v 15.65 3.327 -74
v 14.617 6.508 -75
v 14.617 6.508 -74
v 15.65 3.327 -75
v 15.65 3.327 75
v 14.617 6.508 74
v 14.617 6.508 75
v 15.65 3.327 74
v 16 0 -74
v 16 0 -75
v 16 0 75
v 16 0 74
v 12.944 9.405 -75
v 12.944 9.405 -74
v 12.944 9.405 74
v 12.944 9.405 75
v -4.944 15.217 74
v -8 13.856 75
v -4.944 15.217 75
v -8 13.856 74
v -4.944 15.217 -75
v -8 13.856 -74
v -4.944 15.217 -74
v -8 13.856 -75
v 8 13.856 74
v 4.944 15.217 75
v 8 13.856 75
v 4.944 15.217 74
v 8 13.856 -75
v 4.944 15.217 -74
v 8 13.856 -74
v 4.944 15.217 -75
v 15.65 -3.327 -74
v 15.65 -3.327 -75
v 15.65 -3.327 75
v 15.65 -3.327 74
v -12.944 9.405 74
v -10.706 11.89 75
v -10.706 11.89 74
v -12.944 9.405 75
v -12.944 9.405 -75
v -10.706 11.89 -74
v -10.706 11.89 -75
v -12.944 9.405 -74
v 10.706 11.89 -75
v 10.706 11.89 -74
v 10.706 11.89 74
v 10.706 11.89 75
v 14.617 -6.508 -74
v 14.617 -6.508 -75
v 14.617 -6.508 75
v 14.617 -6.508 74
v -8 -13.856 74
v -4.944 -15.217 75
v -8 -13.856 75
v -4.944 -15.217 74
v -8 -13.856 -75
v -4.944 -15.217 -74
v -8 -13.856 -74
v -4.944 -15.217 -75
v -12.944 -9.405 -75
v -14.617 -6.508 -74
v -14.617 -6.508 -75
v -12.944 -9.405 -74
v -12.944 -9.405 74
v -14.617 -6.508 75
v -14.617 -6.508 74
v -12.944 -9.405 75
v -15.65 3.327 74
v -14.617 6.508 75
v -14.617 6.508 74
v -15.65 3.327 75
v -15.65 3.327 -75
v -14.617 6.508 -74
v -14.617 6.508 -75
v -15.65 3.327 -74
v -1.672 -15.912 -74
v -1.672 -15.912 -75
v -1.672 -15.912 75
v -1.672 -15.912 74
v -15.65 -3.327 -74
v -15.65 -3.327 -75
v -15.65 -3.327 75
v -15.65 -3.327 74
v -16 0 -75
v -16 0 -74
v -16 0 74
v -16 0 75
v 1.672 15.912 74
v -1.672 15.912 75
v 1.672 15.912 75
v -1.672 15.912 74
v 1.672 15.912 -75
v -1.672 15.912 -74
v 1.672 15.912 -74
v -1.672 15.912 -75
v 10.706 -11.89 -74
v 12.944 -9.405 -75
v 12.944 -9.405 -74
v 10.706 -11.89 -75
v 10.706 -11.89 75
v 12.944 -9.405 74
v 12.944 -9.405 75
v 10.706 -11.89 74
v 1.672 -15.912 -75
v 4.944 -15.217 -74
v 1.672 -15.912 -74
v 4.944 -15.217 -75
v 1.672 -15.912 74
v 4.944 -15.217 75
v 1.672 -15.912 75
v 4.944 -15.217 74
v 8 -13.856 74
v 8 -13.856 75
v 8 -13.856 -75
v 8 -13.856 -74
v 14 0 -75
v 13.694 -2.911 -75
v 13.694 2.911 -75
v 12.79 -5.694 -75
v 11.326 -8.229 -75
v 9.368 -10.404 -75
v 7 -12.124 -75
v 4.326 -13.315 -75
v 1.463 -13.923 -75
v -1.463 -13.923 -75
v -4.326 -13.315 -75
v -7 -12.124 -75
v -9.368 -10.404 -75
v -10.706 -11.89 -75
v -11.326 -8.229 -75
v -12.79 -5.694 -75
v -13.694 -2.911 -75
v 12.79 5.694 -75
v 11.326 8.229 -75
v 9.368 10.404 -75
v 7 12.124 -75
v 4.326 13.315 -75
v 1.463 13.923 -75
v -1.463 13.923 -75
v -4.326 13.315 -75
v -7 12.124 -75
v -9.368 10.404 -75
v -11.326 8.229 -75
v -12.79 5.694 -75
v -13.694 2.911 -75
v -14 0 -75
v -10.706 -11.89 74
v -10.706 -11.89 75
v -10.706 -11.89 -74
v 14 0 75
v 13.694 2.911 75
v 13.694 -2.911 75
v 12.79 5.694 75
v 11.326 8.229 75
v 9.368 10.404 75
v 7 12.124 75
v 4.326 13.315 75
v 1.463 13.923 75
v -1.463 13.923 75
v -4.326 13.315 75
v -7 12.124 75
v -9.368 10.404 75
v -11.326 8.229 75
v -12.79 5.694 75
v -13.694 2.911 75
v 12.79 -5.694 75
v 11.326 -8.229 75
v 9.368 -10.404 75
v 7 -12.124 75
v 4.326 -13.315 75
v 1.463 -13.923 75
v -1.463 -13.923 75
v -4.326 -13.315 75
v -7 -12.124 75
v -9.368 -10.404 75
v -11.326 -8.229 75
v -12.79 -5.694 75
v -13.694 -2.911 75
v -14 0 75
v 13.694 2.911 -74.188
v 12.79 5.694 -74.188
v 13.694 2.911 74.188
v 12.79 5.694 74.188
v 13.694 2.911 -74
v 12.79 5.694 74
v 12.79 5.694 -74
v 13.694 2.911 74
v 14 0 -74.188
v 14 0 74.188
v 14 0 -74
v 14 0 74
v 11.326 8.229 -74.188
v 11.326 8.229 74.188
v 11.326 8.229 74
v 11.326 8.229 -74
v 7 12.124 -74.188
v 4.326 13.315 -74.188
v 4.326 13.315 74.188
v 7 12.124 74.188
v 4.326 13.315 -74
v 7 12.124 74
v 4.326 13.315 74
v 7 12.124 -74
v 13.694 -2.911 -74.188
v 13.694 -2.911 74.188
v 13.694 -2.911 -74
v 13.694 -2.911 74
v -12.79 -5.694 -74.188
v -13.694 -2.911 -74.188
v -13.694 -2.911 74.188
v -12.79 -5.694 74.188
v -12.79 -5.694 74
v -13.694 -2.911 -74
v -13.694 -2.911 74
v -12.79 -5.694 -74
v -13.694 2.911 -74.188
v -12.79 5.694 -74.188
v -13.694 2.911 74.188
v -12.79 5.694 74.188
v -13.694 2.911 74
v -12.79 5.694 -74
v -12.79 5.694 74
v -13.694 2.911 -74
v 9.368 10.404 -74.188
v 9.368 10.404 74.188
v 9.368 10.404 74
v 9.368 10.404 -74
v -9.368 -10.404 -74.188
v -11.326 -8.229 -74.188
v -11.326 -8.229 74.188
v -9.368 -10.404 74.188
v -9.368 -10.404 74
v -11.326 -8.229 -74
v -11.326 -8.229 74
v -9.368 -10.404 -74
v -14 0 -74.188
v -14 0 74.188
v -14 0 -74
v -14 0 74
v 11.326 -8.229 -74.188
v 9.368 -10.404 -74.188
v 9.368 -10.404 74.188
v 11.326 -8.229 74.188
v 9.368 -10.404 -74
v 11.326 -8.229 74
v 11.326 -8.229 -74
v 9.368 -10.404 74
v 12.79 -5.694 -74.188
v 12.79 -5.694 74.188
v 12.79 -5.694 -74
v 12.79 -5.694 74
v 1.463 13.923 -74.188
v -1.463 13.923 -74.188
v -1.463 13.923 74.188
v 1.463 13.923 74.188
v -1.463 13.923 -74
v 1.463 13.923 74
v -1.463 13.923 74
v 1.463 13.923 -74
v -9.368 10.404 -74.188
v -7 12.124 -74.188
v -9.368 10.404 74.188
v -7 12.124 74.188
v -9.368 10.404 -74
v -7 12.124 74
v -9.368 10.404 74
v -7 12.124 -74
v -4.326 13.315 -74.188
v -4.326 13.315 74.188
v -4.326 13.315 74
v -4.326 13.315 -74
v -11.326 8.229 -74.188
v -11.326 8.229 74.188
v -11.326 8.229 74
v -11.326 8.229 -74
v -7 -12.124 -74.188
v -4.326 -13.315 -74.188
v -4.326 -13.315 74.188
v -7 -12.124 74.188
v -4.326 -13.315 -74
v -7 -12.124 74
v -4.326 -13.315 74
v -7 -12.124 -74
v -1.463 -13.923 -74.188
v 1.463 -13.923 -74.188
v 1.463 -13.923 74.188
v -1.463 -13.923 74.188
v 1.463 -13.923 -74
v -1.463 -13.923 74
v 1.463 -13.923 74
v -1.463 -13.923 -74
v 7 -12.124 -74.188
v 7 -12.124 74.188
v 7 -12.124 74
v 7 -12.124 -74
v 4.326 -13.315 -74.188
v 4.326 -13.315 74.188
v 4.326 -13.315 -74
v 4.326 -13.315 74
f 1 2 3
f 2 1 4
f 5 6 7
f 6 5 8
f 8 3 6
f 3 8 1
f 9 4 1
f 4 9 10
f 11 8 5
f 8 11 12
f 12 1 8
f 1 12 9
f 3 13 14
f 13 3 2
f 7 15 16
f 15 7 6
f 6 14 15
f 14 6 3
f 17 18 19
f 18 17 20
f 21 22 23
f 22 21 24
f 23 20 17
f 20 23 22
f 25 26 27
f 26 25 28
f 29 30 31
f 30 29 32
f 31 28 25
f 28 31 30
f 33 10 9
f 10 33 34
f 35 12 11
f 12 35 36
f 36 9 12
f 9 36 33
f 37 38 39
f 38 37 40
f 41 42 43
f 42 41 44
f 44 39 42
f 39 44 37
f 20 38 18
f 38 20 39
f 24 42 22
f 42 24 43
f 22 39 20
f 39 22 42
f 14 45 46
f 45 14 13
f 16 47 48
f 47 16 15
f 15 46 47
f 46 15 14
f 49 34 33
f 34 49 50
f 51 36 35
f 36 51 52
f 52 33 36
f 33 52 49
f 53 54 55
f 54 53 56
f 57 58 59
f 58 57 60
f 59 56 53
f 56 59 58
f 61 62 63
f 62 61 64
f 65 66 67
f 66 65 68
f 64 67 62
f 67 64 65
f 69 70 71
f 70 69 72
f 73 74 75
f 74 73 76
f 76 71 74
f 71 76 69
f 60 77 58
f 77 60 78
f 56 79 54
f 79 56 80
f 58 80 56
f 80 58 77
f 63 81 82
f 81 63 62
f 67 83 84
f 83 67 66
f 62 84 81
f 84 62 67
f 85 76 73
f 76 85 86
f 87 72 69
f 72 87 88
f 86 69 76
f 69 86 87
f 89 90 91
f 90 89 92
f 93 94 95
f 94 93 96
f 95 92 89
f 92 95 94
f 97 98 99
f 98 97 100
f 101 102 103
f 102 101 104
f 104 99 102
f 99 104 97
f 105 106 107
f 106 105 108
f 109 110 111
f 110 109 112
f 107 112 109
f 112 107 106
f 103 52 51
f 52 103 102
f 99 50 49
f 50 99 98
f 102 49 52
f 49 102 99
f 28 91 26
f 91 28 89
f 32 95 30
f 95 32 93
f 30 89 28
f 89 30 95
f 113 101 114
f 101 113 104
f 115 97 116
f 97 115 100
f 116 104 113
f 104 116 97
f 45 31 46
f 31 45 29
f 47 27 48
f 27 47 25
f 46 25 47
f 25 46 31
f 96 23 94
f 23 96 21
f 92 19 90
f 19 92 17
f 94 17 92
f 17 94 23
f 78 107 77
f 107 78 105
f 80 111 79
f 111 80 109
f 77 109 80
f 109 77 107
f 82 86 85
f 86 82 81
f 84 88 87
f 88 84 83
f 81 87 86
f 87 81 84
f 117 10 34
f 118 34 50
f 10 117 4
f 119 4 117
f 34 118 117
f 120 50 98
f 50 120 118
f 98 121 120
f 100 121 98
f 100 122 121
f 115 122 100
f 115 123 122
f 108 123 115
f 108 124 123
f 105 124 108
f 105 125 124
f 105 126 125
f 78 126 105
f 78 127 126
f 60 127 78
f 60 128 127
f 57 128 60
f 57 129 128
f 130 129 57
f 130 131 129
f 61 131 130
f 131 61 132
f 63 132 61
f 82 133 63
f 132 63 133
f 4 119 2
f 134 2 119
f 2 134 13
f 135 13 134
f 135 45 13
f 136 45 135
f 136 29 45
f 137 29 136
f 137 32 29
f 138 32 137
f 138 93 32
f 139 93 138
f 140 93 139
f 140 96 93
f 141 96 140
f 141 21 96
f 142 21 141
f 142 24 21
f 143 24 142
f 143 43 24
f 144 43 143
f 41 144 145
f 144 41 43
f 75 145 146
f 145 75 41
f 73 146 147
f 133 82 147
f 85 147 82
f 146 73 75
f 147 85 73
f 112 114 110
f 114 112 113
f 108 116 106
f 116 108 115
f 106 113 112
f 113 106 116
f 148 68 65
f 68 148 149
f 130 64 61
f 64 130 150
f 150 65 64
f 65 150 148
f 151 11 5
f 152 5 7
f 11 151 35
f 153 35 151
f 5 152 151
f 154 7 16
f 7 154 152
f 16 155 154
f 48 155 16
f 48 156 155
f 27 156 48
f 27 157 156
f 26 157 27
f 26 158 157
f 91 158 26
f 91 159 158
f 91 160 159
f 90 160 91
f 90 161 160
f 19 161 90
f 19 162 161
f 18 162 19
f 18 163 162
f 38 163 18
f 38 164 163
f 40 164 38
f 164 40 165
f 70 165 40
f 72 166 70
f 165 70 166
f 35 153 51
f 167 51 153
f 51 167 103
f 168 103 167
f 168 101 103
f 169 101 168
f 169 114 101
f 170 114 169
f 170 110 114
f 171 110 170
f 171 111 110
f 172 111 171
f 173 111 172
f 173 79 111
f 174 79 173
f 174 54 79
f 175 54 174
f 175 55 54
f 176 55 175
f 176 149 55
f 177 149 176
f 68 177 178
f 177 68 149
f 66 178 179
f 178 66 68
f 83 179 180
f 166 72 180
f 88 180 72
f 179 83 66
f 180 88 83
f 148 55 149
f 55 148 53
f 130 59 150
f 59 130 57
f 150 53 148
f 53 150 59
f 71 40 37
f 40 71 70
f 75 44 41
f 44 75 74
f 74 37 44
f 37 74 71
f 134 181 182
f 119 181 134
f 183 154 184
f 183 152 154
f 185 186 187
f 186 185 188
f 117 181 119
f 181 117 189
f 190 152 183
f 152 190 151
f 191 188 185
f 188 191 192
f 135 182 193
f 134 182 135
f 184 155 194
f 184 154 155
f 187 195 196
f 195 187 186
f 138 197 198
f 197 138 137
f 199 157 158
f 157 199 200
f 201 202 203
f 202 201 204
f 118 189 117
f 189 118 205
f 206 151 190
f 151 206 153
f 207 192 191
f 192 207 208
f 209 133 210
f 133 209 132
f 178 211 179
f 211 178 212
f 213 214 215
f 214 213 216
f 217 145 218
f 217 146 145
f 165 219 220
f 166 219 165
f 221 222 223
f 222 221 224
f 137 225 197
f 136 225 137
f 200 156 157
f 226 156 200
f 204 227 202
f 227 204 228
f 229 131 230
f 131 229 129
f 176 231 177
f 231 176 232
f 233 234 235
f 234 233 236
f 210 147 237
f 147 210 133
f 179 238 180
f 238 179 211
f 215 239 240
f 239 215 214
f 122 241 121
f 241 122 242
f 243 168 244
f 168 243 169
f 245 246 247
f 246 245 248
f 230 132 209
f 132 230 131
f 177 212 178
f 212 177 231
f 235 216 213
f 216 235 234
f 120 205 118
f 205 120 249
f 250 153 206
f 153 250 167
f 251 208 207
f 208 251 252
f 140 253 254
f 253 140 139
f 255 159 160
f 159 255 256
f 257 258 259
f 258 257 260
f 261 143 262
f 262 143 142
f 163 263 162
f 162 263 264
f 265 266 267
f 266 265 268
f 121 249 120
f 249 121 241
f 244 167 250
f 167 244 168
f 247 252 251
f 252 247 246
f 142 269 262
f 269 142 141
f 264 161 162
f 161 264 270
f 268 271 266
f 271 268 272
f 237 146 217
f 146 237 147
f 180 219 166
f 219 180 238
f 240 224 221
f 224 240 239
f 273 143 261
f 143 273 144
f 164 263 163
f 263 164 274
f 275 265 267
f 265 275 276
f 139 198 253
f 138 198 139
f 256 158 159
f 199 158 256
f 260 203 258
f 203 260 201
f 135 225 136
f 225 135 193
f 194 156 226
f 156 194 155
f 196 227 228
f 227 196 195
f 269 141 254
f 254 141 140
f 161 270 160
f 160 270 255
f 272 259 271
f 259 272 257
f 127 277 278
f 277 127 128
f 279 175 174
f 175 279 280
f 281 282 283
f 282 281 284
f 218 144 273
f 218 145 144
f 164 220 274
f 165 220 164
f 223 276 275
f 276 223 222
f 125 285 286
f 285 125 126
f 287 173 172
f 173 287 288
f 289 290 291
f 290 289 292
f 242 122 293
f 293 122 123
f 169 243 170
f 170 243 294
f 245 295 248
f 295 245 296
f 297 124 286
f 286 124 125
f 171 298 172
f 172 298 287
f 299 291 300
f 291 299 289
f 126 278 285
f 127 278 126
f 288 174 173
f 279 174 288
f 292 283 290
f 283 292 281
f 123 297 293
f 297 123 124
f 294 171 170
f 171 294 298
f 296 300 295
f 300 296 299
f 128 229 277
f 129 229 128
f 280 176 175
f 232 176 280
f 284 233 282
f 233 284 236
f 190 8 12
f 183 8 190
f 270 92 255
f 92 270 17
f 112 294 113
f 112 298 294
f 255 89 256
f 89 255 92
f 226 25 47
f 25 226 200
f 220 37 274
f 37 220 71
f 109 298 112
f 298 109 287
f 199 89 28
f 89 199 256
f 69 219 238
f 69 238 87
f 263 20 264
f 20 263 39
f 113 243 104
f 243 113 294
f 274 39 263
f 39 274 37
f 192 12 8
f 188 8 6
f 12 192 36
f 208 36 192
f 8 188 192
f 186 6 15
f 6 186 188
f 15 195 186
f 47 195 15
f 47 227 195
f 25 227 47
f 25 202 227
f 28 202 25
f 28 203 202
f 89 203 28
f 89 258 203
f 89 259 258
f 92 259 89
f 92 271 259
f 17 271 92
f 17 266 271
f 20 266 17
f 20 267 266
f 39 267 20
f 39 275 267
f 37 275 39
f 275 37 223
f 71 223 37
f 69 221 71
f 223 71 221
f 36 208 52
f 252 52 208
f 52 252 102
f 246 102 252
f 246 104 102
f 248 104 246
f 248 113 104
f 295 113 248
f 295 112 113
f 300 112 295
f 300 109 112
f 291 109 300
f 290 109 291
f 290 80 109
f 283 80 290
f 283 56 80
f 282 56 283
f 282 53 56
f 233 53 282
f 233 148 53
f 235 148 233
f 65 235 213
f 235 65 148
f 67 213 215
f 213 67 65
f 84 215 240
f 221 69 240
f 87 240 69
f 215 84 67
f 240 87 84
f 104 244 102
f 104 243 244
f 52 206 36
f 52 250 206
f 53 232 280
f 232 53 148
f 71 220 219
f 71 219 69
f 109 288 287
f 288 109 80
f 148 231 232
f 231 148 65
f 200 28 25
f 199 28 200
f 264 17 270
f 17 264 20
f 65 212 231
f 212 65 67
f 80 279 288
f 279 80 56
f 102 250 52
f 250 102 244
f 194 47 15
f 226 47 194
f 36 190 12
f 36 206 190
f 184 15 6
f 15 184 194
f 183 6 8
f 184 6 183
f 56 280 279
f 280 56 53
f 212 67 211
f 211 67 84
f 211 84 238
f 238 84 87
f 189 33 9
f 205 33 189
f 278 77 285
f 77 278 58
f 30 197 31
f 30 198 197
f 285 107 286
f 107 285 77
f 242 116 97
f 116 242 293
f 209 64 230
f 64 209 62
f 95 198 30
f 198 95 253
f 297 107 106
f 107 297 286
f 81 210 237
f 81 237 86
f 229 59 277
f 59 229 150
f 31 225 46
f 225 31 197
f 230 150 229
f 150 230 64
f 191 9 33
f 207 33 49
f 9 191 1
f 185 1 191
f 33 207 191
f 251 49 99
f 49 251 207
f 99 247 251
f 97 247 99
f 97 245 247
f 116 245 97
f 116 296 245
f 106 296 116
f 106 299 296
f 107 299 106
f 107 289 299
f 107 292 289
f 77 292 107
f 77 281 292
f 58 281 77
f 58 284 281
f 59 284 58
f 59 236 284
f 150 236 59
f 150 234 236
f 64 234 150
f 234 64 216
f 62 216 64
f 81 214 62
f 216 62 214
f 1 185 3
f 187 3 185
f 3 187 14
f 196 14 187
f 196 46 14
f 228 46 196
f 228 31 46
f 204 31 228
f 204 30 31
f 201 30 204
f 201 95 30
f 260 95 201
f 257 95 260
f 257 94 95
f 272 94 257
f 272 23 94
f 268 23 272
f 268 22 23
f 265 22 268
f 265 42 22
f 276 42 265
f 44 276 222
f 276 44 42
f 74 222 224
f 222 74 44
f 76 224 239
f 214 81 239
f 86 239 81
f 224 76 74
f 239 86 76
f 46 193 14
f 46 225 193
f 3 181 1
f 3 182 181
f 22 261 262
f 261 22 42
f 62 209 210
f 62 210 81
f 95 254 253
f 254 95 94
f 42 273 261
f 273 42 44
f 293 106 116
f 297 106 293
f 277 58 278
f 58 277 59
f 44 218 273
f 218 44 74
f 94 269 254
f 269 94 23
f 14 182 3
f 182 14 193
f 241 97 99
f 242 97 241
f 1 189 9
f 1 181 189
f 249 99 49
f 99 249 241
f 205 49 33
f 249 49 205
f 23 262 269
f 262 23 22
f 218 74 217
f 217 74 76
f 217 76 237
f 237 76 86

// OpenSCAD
// Parameters
pipe_length = 150; //[75:300:1]
outer_diameter = 32; //[16:64:0.5]
wall_thickness = 2; //[1:4:0.1]
chamfer_length = 1.5; //[0.5:3:0.1]
overlap = 1; //[0.5:2:0.1]

// Pipe Body
module pipe_body() {
  cylinder(h = pipe_length, r = outer_diameter / 2, center = true);
}

// Inner Bore
module inner_bore() {
  cylinder(h = pipe_length + 2 * overlap, r = outer_diameter / 2 - wall_thickness, center = true);
}

// End Chamfer
module end_chamfer_top() {
  translate([0, 0, pipe_length / 2 - chamfer_length / 2 + overlap / 2])
    cylinder(h = chamfer_length, r1 = outer_diameter / 2, r2 = 0, center = true);
}

module end_chamfer_bottom() {
  translate([0, 0, -pipe_length / 2 + chamfer_length / 2 - overlap / 2])
    rotate([180, 0, 0])
    cylinder(h = chamfer_length, r1 = outer_diameter / 2, r2 = 0, center = true);
}

// End Chamfers
module end_chamfers() {
  union() {
    end_chamfer_top();
    end_chamfer_bottom();
  }
}

// Pipe Shell without Chamfers
module pipe_shell_no_chamfer() {
  difference() {
    pipe_body();
    inner_bore();
  }
}

// Pipe Shell with Chamfers
module pipe_shell_with_chamfers() {
  difference() {
    pipe_shell_no_chamfer();
    end_chamfers();
  }
}

// Final Output
pipe_shell_with_chamfers();
